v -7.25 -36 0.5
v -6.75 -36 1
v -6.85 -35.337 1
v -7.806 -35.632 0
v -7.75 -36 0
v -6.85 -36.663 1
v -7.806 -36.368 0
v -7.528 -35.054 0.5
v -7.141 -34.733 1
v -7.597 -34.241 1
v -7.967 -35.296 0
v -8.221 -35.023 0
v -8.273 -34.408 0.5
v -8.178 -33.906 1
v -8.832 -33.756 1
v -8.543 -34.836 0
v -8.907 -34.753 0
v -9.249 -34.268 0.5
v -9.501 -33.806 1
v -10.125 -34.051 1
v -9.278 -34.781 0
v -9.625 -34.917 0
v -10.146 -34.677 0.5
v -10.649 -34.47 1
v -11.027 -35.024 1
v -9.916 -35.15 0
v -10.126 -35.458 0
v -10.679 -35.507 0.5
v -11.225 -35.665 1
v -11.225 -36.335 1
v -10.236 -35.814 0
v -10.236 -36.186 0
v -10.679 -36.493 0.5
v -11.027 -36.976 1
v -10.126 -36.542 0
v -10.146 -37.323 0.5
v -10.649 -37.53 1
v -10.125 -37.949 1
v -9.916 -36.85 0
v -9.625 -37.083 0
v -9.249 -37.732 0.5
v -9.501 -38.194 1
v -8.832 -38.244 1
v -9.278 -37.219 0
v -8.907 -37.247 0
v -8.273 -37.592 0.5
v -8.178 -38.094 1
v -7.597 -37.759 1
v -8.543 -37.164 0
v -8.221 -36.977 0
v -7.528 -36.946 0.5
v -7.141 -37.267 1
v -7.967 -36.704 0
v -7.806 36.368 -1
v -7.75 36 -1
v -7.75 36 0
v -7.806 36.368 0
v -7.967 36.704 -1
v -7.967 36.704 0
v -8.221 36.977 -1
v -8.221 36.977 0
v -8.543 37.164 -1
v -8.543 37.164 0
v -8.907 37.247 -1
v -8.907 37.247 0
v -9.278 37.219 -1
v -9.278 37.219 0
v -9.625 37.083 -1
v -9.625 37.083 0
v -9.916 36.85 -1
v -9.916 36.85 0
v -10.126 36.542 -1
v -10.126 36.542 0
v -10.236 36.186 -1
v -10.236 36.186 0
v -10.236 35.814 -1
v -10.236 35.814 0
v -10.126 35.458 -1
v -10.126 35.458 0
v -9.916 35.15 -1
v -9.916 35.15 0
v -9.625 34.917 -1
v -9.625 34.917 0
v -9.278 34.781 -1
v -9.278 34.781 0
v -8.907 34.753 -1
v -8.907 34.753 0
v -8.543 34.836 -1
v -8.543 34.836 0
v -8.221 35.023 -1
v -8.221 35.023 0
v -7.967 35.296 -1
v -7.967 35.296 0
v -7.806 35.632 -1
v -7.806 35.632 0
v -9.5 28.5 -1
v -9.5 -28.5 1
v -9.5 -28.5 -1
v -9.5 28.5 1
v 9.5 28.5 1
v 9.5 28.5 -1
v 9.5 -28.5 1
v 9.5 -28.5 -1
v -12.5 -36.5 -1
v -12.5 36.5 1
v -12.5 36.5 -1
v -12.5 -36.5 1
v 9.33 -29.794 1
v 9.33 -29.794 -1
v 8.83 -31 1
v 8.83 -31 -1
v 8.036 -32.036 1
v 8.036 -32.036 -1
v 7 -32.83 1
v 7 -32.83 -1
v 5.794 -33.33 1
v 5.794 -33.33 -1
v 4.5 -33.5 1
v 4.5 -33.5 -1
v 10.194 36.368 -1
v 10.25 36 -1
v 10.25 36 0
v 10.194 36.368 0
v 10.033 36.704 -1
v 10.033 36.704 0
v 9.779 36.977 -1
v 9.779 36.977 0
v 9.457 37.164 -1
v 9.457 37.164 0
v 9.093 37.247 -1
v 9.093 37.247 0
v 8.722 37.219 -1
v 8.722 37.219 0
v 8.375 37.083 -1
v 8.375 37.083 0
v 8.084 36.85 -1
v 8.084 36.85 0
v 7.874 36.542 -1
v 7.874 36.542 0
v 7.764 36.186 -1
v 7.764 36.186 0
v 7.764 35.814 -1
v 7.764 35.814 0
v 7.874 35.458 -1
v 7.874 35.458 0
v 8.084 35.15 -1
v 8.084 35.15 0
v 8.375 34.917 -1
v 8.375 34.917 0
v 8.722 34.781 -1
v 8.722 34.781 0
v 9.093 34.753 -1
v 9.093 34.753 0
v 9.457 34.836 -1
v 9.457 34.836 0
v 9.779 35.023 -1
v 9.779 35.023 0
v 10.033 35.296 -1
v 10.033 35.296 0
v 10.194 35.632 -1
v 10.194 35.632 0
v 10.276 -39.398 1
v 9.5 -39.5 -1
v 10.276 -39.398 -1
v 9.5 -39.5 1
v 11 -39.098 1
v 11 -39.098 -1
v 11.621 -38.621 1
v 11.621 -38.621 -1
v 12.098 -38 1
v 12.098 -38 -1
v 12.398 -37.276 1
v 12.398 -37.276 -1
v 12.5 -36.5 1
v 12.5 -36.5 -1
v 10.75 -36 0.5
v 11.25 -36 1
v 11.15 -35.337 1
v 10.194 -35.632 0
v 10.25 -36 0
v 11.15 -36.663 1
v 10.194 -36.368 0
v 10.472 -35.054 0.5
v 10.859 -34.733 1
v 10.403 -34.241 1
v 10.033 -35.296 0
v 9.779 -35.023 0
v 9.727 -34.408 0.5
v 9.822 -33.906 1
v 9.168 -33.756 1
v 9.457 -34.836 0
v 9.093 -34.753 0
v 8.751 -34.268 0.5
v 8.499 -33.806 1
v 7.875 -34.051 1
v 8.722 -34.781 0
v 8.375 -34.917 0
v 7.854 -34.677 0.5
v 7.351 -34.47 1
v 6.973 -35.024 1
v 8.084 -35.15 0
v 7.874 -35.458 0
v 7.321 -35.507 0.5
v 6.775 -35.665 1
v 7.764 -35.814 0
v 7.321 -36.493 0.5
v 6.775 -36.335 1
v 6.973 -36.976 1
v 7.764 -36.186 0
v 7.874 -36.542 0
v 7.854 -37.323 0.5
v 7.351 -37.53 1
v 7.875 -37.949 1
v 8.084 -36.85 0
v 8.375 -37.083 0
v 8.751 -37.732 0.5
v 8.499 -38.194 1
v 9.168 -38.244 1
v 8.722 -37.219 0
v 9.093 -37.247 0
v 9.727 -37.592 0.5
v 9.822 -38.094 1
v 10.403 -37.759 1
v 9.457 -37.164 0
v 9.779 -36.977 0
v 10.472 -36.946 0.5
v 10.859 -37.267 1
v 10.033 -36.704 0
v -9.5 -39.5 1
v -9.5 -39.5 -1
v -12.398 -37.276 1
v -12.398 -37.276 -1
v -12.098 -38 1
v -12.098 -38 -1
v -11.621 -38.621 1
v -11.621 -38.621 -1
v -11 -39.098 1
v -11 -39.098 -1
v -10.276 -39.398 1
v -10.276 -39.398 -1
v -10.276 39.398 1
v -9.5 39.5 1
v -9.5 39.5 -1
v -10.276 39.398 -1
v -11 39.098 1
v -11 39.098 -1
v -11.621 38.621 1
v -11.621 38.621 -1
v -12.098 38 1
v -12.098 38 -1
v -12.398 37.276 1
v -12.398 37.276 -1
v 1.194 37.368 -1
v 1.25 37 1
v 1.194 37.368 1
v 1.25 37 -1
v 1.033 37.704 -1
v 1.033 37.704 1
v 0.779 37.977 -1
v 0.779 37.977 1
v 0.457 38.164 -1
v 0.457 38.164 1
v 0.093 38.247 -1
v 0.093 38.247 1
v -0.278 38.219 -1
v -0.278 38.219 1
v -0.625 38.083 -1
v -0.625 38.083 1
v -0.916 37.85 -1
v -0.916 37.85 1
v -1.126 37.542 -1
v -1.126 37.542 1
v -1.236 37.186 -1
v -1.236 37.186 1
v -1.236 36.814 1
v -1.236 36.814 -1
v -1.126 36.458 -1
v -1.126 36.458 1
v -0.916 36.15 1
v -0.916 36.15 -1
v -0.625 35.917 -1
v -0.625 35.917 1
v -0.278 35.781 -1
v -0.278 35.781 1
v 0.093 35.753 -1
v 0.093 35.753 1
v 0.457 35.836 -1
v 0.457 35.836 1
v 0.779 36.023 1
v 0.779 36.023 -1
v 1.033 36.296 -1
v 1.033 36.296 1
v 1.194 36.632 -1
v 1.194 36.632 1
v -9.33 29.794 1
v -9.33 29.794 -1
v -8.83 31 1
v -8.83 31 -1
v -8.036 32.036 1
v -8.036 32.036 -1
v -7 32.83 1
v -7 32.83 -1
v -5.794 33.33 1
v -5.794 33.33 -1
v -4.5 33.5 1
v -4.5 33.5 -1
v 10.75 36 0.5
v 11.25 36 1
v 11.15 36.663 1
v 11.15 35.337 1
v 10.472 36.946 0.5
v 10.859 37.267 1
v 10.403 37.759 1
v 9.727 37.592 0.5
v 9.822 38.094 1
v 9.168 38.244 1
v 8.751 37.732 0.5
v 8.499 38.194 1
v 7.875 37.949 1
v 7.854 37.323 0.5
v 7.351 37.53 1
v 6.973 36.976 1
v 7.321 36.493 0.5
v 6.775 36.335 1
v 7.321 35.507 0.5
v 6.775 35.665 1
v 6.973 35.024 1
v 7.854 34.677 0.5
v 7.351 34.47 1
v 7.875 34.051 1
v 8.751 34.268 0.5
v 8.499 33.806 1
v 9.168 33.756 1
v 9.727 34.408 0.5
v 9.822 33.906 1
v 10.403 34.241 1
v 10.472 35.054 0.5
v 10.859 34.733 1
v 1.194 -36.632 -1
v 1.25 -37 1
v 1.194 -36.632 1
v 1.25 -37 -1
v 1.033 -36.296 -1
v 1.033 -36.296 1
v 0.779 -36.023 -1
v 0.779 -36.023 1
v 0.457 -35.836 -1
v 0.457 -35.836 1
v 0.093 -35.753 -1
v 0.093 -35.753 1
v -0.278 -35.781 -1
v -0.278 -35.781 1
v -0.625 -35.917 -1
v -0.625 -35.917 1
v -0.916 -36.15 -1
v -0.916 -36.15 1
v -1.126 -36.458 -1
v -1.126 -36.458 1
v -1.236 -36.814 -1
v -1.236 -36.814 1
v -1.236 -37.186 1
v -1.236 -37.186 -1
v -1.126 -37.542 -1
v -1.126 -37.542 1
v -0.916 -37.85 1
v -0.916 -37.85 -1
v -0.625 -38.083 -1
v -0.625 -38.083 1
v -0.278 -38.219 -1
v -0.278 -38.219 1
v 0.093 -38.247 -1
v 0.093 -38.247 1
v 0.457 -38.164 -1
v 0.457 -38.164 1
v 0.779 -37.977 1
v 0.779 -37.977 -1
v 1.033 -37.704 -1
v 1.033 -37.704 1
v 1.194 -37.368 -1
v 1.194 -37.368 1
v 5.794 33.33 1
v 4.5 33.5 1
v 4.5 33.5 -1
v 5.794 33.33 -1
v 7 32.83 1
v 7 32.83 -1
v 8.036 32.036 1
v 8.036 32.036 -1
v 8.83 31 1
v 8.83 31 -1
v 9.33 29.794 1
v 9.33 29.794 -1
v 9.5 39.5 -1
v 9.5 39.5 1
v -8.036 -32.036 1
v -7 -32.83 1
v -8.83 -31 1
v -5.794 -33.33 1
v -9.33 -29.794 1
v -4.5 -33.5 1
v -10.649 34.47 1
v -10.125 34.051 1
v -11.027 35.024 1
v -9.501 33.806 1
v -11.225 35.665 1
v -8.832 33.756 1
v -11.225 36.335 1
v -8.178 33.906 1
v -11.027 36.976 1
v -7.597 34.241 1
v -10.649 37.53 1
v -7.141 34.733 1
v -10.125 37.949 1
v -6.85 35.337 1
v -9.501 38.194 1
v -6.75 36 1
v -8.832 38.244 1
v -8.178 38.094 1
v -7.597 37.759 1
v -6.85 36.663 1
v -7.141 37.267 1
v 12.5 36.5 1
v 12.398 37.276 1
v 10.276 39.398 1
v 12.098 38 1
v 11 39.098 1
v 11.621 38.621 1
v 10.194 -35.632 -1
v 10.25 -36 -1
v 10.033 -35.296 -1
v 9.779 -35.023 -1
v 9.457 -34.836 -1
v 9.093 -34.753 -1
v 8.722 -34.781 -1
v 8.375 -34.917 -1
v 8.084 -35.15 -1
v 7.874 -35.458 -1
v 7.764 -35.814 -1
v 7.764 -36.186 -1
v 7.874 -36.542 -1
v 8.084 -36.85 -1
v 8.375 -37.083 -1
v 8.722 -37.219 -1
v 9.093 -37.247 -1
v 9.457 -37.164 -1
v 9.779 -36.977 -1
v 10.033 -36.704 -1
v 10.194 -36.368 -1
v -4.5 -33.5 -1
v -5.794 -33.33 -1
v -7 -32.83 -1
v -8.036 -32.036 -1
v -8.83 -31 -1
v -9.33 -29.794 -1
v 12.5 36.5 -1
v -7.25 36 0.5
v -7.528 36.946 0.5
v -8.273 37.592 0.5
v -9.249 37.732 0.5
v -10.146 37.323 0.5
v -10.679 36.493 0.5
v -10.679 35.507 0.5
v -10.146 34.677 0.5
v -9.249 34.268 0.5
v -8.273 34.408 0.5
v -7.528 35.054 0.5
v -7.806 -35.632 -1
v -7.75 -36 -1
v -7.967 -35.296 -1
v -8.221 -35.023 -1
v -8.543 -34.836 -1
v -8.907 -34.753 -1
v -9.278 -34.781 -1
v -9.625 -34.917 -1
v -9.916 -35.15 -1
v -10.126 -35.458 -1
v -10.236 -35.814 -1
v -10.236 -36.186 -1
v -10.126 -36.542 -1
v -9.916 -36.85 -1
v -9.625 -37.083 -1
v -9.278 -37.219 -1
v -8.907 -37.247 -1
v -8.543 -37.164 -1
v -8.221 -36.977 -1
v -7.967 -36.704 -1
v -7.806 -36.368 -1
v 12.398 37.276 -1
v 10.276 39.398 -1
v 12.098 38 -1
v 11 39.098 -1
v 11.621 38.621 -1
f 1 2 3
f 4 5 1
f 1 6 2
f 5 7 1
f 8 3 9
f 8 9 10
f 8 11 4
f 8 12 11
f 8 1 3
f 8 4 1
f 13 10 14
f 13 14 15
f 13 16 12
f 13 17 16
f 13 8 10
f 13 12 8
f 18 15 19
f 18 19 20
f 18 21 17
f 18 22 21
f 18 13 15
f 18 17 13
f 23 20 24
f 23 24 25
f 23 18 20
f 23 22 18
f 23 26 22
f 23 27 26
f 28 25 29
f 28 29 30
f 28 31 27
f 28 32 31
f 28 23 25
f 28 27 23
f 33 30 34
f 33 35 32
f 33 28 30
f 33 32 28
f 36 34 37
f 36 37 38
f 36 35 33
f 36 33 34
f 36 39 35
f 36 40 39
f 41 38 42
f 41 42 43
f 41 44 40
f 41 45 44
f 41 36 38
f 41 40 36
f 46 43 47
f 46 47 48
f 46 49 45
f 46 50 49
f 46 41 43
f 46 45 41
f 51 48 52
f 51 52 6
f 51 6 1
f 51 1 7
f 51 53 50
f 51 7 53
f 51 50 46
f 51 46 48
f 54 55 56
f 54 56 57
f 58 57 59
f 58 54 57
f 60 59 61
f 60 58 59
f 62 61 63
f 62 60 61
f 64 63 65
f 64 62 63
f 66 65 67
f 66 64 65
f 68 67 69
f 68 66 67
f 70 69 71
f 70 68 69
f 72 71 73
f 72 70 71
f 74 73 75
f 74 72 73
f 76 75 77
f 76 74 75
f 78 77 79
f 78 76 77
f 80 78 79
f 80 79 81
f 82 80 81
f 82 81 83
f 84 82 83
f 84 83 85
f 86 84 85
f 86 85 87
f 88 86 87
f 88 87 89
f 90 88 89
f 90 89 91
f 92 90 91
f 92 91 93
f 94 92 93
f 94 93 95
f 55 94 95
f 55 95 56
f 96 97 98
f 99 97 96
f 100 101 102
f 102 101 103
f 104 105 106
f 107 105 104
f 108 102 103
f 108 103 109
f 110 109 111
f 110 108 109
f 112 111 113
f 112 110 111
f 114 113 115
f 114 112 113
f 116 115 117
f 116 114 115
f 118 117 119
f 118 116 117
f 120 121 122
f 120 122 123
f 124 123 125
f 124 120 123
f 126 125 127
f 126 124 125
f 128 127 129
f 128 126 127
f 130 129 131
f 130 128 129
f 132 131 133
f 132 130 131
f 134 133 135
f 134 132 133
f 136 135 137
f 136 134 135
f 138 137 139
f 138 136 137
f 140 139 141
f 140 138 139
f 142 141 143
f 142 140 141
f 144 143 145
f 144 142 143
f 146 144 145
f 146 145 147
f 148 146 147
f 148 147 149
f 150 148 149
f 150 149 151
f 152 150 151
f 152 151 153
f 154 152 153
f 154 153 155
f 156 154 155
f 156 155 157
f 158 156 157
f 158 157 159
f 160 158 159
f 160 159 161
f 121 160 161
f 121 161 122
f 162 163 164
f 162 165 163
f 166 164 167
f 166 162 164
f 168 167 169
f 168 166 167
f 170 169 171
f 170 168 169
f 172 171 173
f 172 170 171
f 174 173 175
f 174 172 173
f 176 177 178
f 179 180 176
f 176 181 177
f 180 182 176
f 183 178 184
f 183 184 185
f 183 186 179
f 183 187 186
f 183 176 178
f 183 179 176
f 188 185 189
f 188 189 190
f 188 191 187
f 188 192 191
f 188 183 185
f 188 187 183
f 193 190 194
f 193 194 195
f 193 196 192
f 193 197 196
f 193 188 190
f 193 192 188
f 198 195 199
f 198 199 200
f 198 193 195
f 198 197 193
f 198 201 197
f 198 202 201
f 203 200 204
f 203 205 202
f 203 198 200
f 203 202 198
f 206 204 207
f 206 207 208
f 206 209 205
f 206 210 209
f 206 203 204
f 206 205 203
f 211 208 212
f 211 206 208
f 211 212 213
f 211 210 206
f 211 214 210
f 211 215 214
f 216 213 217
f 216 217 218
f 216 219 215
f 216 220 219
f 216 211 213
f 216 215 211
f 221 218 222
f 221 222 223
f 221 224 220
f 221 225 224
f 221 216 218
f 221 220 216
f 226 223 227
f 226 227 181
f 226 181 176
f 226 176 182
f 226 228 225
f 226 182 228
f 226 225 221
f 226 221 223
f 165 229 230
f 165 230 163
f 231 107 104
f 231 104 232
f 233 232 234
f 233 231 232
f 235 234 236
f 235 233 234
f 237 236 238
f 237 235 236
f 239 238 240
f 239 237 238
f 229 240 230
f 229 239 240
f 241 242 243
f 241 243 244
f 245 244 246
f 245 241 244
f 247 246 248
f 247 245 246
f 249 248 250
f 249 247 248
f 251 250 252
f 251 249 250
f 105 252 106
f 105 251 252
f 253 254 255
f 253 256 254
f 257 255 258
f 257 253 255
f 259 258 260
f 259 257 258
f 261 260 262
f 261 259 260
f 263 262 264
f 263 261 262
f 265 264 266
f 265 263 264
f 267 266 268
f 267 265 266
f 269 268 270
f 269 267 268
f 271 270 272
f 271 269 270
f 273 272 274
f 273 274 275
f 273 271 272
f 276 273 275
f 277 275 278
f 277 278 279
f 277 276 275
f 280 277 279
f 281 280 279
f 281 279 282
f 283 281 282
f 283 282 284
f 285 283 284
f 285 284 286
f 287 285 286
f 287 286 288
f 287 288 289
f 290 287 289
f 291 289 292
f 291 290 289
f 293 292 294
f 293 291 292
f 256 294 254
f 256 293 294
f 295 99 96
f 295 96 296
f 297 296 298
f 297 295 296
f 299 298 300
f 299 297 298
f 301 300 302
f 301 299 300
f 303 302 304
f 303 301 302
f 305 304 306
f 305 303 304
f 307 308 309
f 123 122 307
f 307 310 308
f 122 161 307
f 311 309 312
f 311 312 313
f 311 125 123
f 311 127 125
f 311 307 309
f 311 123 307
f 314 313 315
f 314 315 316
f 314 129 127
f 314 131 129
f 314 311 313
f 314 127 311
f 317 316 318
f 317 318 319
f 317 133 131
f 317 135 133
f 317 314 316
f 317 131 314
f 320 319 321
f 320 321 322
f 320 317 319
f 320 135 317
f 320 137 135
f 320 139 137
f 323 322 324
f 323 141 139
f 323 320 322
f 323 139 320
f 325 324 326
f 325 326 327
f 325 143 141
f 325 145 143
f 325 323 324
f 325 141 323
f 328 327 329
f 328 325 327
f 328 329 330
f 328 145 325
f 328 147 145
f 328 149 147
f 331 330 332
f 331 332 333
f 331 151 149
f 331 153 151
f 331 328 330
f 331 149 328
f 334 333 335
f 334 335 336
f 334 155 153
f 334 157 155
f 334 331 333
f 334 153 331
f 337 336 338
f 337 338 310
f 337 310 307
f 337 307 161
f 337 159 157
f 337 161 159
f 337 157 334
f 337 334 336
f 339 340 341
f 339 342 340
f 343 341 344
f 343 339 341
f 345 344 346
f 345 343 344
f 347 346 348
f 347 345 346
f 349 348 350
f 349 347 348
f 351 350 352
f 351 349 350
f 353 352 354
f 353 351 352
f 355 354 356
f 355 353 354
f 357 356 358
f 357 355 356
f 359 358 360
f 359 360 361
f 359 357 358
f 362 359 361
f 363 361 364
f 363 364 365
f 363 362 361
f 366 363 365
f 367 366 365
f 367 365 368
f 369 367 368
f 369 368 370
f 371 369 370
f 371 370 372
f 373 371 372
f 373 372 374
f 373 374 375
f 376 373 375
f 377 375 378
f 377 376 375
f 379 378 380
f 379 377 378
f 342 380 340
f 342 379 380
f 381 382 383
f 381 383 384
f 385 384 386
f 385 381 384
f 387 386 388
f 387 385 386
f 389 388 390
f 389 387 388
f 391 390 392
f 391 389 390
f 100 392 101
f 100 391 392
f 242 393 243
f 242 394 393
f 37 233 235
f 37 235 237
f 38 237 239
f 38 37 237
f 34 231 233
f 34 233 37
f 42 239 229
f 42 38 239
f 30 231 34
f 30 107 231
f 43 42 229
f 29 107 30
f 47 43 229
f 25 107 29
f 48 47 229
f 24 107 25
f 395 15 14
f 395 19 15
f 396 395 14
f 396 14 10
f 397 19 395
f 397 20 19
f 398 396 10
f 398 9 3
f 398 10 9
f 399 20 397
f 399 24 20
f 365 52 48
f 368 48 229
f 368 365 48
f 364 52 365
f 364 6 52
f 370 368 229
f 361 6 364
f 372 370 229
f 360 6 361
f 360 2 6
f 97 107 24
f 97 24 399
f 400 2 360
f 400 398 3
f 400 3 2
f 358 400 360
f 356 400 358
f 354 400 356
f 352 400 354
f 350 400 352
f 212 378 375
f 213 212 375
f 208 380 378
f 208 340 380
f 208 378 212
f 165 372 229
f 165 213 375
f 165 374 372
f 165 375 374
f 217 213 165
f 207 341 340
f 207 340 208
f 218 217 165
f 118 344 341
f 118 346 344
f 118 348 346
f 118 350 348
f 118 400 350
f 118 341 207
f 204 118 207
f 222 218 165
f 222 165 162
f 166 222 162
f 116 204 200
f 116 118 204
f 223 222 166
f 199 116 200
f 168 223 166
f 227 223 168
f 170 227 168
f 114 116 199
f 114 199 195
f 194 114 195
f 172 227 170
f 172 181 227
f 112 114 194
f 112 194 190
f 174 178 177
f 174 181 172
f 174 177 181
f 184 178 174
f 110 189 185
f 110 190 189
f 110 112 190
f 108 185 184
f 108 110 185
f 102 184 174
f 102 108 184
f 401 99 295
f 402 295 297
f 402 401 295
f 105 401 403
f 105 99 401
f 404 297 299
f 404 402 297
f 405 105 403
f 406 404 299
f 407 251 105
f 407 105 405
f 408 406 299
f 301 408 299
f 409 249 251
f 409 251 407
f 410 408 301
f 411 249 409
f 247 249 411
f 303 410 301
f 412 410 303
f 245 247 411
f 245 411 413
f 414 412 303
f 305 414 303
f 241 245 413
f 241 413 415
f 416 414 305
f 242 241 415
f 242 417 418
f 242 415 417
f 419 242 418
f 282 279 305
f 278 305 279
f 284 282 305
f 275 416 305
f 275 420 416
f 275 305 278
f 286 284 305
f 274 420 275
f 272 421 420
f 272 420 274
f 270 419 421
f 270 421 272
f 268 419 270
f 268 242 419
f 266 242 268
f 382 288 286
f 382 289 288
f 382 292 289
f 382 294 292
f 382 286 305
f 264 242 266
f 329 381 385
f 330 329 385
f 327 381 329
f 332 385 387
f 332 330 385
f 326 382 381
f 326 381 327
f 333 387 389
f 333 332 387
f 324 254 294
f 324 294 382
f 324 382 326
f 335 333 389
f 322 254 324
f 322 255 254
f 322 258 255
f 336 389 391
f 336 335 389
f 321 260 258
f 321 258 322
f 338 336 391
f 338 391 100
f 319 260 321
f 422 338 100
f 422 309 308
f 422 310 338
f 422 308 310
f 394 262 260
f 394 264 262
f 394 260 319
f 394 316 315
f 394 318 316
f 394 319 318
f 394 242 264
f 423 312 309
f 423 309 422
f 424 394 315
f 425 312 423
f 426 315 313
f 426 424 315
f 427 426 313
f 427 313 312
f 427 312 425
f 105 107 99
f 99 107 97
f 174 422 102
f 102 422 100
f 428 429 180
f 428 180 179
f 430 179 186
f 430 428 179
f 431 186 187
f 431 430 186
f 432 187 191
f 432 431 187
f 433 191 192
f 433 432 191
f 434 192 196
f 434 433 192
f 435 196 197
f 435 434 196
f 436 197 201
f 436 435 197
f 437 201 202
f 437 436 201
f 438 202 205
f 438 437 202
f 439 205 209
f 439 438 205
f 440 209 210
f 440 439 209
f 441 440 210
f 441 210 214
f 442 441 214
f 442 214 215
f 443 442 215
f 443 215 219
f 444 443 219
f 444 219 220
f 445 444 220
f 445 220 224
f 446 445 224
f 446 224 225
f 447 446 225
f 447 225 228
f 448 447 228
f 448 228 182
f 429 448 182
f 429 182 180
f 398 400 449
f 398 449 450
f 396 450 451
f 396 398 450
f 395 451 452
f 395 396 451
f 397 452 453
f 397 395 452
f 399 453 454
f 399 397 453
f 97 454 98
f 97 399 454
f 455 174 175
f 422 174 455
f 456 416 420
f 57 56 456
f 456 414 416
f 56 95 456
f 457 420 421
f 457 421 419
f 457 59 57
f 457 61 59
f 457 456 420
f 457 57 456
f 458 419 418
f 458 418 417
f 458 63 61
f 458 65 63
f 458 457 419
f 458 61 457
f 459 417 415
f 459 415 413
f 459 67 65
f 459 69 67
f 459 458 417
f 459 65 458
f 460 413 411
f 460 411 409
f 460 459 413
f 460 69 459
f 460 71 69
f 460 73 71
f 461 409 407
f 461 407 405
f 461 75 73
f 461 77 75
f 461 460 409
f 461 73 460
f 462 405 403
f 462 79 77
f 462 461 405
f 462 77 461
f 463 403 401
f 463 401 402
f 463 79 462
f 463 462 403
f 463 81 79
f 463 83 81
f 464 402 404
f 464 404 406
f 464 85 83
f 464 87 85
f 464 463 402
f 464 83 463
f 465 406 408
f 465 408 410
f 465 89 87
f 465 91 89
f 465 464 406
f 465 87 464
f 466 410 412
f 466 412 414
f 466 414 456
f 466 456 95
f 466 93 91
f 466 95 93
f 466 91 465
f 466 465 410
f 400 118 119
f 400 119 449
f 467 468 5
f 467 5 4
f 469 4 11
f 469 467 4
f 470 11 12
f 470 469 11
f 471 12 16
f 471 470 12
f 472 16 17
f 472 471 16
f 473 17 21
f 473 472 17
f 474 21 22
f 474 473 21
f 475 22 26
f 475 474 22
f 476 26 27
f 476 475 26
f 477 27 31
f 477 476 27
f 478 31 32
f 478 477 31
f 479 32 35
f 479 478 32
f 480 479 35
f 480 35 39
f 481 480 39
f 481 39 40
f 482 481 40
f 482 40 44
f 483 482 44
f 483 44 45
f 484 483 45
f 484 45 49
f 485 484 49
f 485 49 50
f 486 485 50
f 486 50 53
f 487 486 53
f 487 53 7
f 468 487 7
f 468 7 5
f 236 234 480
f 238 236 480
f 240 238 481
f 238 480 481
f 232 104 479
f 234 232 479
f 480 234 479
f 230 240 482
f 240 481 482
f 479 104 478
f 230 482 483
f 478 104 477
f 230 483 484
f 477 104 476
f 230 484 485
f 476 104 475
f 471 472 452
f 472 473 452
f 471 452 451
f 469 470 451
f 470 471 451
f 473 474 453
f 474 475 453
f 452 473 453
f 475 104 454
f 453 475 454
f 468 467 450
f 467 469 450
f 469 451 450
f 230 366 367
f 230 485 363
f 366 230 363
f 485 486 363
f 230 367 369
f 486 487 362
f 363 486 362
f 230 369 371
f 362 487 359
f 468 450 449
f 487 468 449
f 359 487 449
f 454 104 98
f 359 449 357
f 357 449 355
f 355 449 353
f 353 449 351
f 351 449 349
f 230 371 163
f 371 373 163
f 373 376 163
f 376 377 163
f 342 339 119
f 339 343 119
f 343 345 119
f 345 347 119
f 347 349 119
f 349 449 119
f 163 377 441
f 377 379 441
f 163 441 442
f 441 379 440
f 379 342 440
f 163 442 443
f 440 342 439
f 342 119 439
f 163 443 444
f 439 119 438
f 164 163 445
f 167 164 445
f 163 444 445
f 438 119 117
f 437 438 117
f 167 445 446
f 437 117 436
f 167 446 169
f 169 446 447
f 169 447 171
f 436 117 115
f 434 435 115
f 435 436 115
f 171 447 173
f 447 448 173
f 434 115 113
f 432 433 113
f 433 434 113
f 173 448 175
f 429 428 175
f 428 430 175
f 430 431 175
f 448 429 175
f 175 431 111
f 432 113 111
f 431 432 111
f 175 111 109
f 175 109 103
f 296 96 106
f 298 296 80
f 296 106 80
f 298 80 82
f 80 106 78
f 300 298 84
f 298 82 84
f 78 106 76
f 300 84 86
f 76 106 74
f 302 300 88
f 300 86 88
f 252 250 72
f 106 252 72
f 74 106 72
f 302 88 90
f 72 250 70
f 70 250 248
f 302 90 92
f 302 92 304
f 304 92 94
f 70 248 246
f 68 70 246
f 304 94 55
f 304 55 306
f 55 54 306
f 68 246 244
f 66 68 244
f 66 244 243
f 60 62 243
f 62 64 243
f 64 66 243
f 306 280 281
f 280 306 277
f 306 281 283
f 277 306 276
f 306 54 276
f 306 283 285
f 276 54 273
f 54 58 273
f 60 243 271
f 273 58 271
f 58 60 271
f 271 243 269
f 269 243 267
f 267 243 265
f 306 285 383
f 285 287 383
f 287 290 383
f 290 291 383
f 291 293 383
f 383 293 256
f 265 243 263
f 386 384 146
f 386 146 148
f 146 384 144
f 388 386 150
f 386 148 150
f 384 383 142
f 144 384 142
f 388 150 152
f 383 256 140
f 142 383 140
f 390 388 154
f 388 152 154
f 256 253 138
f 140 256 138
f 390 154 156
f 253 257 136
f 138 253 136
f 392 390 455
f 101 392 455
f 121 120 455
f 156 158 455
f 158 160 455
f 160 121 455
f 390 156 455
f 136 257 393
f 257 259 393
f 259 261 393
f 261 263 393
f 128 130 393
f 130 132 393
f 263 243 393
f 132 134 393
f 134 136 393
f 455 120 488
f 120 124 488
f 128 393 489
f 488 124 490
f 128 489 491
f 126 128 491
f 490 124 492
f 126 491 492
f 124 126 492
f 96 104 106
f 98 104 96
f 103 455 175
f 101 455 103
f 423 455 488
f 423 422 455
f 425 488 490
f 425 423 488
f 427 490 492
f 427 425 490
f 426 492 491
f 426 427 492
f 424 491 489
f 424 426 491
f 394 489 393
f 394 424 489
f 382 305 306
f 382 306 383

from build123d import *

# Parameters (mm, degrees)
F0_R     = 1.25
F1_DEPTH = 1
F2_SIZE  = 1


with BuildPart() as f1:
    # F0 (on Top) → F1 (new body, symmetric)
    with BuildSketch(Plane.XY):
        with BuildLine():
            Line((9.5, 39.5), (-9.5, 39.5))
            ThreePointArc((-9.5, 39.5), (-11.62132, 38.62132), (-12.5, 36.5))
            Line((-12.5, 36.5), (-12.5, -36.5))
            ThreePointArc((-12.5, -36.5), (-11.62132, -38.62132), (-9.5, -39.5))
            Line((-9.5, -39.5), (9.5, -39.5))
            ThreePointArc((9.5, -39.5), (11.62132, -38.62132), (12.5, -36.5))
            Line((12.5, -36.5), (12.5, 36.5))
            ThreePointArc((12.5, 36.5), (11.62132, 38.62132), (9.5, 39.5))
        make_face()
        with Locations((-9, -36)):
            Circle(F0_R, mode=Mode.SUBTRACT)
        with Locations((0, -37)):
            Circle(F0_R, mode=Mode.SUBTRACT)
        with Locations((9, -36)):
            Circle(F0_R, mode=Mode.SUBTRACT)
        with BuildLine():
            ThreePointArc((-9.5, 28.5), (-8.035534, 32.035534), (-4.5, 33.5))
            Line((-4.5, 33.5), (4.5, 33.5))
            ThreePointArc((4.5, 33.5), (8.035534, 32.035534), (9.5, 28.5))
            Line((9.5, 28.5), (9.5, -28.5))
            ThreePointArc((9.5, -28.5), (8.035534, -32.035534), (4.5, -33.5))
            Line((4.5, -33.5), (-4.5, -33.5))
            ThreePointArc((-4.5, -33.5), (-8.035534, -32.035534), (-9.5, -28.5))
            Line((-9.5, -28.5), (-9.5, 28.5))
        make_face(mode=Mode.SUBTRACT)
        with Locations((-9, 36)):
            Circle(F0_R, mode=Mode.SUBTRACT)
        with Locations((0, 37)):
            Circle(F0_R, mode=Mode.SUBTRACT)
        with Locations((9, 36)):
            Circle(F0_R, mode=Mode.SUBTRACT)
    extrude(amount=F1_DEPTH, both=True)

    # F2
    f2_edges = [f1.edges().sort_by_distance(p)[0] for p in [
        (-10.25, 36, 1),
        (7.75, 36, 1),
        (7.75, -36, 1),
        (-10.25, -36, 1),
    ]]
    chamfer(f2_edges, length=F2_SIZE)


solid = f1.part
